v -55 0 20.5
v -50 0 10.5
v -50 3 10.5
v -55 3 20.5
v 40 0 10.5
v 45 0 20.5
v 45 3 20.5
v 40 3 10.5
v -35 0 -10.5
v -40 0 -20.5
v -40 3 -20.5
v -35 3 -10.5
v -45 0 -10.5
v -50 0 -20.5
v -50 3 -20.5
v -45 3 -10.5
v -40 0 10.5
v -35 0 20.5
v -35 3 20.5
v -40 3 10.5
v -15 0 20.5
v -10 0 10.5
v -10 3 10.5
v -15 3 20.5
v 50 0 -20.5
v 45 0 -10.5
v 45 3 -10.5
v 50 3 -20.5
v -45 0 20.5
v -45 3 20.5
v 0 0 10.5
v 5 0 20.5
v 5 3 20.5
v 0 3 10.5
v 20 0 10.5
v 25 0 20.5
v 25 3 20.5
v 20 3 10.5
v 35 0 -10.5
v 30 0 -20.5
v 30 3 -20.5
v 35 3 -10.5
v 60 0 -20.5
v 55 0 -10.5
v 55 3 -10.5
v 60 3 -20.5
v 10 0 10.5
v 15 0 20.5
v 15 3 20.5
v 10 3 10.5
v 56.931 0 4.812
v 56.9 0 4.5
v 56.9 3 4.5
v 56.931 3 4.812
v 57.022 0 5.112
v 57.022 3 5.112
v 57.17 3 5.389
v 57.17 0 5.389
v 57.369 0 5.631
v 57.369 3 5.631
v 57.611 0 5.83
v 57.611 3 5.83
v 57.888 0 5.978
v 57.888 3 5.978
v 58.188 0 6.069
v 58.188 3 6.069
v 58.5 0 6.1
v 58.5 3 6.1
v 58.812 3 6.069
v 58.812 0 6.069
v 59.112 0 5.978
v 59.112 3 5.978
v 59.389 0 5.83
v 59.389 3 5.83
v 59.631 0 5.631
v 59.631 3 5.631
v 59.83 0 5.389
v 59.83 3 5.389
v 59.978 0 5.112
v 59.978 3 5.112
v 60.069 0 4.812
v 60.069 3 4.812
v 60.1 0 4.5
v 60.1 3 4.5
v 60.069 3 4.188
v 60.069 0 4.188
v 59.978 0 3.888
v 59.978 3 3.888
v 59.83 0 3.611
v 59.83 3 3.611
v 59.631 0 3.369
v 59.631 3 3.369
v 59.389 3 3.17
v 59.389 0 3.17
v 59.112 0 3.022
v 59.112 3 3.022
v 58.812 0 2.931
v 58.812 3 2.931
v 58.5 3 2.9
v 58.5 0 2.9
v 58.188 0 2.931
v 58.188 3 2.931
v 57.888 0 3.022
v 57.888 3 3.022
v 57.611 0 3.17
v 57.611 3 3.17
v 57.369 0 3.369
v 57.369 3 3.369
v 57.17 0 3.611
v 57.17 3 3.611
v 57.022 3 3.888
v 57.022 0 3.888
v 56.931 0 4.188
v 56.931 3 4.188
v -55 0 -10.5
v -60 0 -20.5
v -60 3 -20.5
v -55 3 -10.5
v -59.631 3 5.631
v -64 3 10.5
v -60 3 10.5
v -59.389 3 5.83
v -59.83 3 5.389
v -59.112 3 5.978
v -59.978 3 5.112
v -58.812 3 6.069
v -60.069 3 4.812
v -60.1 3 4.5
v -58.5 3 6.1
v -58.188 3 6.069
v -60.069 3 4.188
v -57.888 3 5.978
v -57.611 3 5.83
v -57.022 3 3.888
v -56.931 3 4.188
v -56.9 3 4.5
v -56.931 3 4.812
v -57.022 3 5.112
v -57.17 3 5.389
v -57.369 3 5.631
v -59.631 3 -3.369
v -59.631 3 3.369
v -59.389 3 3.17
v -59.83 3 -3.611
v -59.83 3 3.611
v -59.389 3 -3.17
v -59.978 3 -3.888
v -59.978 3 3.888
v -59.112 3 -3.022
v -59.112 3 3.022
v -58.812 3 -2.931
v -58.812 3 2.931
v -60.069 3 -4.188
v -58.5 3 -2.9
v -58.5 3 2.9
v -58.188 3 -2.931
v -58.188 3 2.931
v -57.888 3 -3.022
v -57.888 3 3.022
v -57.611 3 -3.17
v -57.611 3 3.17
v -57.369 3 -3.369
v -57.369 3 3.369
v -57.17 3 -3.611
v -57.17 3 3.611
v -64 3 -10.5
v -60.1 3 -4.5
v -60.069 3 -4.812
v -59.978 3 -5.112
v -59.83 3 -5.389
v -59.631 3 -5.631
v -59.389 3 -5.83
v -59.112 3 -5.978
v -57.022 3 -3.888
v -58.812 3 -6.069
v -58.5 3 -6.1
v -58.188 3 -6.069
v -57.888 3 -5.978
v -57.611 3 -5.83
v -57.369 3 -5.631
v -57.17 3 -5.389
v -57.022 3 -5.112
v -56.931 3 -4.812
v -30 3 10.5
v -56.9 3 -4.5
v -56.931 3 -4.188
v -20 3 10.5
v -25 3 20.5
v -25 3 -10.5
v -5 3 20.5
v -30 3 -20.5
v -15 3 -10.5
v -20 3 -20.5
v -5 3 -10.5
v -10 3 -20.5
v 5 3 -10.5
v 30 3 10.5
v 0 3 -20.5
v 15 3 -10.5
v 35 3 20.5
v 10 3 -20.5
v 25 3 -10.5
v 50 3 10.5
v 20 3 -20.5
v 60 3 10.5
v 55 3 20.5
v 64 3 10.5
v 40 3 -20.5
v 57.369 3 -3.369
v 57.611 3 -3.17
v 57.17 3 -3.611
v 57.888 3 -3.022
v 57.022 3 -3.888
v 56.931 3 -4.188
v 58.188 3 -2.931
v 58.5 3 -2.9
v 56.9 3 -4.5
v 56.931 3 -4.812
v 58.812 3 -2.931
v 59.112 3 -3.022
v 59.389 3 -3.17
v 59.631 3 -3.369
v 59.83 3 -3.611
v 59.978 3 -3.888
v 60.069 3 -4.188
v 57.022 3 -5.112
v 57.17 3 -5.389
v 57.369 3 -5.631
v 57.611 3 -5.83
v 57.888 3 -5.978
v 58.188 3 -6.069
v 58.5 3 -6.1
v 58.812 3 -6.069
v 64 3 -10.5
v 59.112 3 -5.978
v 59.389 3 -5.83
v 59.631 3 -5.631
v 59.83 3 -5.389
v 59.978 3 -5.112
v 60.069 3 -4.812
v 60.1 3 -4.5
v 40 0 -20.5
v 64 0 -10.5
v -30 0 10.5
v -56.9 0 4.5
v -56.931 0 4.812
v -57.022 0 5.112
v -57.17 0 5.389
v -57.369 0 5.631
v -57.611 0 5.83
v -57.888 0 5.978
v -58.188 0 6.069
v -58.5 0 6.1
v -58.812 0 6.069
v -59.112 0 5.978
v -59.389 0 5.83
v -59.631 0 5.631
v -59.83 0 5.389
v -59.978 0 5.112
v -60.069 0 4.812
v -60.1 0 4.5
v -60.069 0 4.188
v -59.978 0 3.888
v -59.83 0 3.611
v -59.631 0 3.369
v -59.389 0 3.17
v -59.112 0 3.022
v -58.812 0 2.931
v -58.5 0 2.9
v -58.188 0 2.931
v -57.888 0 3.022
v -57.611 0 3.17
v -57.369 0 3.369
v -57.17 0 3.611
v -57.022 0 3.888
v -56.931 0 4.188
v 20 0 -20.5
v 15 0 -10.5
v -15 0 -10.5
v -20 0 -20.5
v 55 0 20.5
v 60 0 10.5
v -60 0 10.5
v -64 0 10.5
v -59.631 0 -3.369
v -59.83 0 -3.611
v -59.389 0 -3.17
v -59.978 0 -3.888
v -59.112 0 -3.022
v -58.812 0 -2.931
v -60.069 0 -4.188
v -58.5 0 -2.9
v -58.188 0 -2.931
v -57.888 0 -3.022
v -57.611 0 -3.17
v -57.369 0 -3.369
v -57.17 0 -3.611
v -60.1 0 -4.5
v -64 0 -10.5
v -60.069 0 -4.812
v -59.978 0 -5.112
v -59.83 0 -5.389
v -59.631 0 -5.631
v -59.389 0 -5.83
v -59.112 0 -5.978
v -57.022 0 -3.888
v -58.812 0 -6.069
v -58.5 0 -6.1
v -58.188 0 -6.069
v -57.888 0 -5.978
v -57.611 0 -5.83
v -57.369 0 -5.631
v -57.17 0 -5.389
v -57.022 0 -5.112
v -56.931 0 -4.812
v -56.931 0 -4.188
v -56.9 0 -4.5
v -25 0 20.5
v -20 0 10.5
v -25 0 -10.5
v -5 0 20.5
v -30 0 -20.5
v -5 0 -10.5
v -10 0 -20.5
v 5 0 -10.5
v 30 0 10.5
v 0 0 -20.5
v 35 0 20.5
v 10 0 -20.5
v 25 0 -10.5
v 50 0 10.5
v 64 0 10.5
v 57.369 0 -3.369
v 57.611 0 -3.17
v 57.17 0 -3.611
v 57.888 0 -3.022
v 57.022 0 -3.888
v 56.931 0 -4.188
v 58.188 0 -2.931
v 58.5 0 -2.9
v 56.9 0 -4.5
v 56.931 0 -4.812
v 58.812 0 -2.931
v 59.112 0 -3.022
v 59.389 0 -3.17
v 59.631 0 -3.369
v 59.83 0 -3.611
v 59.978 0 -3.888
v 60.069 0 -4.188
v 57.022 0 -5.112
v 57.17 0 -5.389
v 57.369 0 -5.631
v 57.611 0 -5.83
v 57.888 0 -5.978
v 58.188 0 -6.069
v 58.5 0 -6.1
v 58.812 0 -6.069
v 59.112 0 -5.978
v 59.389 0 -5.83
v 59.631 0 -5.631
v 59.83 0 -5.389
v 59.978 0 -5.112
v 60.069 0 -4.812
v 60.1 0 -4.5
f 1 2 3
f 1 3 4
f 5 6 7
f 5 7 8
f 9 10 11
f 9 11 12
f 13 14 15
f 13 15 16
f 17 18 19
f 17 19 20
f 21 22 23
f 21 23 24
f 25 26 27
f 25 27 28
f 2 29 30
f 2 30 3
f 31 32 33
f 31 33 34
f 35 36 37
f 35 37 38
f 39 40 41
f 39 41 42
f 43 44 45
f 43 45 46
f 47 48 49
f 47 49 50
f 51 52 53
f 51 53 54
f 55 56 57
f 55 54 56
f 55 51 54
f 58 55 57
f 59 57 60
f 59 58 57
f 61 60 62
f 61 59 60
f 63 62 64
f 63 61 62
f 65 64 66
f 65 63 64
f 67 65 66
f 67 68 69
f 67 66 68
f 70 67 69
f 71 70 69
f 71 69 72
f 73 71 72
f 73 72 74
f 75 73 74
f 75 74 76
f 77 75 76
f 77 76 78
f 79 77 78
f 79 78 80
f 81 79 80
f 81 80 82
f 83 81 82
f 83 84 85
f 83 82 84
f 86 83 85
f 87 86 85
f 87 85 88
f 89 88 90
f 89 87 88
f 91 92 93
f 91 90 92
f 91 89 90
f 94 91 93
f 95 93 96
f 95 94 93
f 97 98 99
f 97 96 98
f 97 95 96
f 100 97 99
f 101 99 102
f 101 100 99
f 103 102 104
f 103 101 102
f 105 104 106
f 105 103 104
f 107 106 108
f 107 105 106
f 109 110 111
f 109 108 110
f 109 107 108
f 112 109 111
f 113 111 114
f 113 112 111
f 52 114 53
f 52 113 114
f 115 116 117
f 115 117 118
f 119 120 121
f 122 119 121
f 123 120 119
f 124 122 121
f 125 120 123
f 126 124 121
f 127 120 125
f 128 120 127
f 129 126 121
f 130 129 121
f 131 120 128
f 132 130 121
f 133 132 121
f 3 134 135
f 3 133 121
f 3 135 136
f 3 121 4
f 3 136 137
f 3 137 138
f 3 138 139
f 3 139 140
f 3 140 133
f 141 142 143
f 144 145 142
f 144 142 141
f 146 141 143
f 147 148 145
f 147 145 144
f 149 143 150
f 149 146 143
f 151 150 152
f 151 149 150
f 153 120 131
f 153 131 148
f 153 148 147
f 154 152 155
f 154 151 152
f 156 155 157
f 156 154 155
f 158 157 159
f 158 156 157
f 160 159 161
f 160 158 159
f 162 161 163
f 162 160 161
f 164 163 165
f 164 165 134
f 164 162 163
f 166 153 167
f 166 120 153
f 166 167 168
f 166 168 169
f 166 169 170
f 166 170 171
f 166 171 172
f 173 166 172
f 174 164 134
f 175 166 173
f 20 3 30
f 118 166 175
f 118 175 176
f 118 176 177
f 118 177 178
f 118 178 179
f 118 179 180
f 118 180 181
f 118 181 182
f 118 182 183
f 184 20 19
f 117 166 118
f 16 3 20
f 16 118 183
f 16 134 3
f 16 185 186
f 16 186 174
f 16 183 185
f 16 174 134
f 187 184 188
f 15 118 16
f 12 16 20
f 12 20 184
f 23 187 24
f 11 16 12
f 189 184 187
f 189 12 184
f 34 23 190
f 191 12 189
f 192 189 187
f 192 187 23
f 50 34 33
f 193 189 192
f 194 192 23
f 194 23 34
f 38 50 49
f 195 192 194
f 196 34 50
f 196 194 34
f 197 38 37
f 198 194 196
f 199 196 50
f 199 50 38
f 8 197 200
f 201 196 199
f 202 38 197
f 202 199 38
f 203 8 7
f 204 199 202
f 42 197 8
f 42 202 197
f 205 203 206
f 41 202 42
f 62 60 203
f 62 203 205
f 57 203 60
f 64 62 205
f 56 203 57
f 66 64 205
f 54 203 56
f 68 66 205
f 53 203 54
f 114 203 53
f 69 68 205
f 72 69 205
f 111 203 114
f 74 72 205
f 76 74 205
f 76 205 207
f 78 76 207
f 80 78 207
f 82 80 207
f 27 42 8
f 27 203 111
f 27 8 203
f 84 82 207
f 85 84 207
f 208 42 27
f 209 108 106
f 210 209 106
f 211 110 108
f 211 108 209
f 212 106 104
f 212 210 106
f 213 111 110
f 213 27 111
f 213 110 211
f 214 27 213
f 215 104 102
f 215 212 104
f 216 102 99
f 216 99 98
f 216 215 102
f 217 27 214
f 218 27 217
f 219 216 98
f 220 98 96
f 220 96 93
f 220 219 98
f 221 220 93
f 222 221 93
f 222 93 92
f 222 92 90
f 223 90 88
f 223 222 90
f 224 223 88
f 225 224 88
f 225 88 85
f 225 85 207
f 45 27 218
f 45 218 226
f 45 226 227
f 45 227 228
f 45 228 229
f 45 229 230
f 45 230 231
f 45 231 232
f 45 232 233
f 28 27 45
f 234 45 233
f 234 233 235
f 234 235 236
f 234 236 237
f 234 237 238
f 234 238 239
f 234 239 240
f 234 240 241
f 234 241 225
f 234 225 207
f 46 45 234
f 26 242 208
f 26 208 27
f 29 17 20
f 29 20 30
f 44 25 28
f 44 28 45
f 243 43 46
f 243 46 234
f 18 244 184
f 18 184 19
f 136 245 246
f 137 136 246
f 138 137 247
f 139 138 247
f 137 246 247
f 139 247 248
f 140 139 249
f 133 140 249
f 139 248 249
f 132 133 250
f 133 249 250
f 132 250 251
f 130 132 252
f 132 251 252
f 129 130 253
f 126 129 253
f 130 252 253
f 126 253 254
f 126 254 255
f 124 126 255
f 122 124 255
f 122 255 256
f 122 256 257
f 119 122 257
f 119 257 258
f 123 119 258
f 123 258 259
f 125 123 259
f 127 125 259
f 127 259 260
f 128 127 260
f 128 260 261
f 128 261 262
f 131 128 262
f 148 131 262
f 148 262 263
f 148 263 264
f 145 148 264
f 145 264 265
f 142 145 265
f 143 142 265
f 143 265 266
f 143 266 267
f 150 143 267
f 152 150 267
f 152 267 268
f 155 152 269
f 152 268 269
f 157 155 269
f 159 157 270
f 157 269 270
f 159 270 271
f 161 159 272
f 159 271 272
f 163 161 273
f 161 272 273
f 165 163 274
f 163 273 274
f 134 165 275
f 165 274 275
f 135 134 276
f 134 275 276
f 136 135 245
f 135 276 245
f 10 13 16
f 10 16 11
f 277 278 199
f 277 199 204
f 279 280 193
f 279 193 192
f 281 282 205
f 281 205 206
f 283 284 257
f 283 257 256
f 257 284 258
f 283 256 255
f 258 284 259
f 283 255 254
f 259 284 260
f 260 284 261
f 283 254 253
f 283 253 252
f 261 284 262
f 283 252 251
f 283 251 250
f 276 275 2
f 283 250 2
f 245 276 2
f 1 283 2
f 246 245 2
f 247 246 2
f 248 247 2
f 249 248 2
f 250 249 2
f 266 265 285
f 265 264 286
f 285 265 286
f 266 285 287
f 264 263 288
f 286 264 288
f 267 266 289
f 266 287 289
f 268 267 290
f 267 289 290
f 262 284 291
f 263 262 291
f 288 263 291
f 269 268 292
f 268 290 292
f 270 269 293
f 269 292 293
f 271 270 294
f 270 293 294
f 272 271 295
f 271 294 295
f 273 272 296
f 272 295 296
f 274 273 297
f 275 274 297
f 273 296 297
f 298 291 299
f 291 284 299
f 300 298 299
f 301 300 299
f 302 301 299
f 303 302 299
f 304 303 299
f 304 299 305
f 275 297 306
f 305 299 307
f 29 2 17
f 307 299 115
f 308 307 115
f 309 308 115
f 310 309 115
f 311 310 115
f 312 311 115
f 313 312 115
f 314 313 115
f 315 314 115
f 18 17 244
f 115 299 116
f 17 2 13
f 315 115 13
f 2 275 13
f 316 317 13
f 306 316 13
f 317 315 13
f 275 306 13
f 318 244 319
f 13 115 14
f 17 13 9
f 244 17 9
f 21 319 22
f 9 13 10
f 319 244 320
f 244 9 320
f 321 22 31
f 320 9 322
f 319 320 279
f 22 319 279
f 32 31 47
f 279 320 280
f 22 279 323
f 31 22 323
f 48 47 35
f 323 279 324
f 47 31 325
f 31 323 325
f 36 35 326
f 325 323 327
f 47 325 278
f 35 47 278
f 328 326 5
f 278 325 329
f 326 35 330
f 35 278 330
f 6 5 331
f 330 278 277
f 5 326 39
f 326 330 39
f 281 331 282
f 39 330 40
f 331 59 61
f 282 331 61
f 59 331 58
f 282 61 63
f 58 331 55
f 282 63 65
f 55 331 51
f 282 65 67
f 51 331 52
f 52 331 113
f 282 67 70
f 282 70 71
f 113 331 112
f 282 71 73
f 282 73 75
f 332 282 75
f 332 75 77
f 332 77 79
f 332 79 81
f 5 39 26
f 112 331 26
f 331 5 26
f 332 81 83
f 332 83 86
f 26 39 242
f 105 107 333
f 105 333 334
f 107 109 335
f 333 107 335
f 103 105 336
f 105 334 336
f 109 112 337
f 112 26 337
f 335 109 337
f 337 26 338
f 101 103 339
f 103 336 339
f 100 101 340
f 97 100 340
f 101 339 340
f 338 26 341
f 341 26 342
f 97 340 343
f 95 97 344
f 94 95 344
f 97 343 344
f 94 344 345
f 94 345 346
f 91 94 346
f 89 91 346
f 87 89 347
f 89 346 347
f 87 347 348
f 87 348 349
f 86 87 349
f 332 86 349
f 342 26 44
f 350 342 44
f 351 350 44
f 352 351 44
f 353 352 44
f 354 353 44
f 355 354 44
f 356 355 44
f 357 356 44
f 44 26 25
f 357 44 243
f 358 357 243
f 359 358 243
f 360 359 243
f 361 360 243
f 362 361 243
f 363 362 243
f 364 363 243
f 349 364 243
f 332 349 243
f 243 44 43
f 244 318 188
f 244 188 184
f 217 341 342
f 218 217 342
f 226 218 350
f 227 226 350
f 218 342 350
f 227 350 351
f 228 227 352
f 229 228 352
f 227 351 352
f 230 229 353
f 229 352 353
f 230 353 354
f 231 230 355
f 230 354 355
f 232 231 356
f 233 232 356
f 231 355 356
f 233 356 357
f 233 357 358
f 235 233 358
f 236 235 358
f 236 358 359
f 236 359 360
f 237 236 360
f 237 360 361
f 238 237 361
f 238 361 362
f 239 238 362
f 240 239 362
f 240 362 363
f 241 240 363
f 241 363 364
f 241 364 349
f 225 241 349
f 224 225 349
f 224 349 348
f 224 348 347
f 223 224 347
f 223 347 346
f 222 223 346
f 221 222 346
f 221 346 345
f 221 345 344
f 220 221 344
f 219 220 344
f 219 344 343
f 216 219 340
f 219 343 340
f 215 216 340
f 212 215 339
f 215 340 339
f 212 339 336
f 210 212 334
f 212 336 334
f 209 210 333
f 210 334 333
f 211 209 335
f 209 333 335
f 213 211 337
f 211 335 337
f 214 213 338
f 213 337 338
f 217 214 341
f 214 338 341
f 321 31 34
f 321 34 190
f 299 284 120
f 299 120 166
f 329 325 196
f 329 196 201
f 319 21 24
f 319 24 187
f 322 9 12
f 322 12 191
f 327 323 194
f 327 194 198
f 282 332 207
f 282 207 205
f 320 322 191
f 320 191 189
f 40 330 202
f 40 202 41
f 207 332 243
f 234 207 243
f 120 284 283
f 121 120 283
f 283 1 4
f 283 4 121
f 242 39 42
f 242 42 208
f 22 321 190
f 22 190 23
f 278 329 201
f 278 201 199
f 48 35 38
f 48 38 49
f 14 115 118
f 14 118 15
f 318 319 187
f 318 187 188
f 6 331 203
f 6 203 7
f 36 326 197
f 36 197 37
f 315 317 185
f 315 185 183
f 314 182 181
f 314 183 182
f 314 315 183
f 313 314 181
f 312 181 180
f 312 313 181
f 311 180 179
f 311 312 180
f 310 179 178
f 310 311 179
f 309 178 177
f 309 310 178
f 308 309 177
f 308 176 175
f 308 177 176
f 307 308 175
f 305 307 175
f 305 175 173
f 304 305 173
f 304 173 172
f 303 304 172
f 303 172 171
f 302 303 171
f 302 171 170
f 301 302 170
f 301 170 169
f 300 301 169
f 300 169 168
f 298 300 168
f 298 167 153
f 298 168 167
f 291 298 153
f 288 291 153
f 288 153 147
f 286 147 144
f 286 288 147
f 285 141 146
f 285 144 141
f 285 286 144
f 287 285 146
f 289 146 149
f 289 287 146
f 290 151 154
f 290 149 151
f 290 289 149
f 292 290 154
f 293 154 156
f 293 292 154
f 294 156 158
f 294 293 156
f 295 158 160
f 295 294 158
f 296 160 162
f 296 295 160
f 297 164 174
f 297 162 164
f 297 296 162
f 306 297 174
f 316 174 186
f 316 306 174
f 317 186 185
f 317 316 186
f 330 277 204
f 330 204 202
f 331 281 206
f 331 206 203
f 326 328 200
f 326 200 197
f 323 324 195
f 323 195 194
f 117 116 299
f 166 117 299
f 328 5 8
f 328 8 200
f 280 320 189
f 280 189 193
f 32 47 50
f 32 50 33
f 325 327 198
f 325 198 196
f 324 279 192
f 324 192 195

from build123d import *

# Parameters (mm, degrees)
SKETCH1_W               = 128
SKETCH1_H               = 41
BOSS_EXTRUDE1_DEPTH     = 3
CUT_EXTRUDE2_START      = -4
CUT_EXTRUDE2_DEPTH      = 5
LPATTERN3_COUNT         = 12
LPATTERN3_PITCH         = 10
CUT_EXTRUDE3_START      = -4
CUT_EXTRUDE3_DEPTH      = 5
LPATTERN5_COUNT         = 12
LPATTERN5_PITCH         = 10
CUT_EXTRUDE4_START      = -4
SKETCH6_R               = 1.6
CUT_EXTRUDE4_DEPTH      = 5
MIRROR3_START           = -4
MIRROR3_COPY_1_SKETCH_R = 1.6
MIRROR3_COPY_1_DEPTH    = 5
CUT_EXTRUDE5_START      = -4
CUT_EXTRUDE5_DEPTH      = 5
CUT_EXTRUDE6_START      = -4
SKETCH8_W               = 4
SKETCH8_H               = 10
CUT_EXTRUDE6_DEPTH      = 5


with BuildPart() as part:
    # Sketch1 → Boss-Extrude1 (new body)
    with BuildSketch(Plane(origin=(0, 0, 0), x_dir=(1, 0, 0), z_dir=(0, 1, 0))):
        Rectangle(SKETCH1_W, SKETCH1_H)
    extrude(amount=BOSS_EXTRUDE1_DEPTH)

    # Sketch2 → Cut-Extrude2 (cut)
    with BuildSketch(Plane(origin=(0, 3, 0), x_dir=(1, 0, 0), z_dir=(0, 1, 0)).offset(CUT_EXTRUDE2_START)):
        Polygon((-60, 20.5), (-55, 10.5), (-50, 20.5), align=None)
    cut_extrude2 = extrude(amount=CUT_EXTRUDE2_DEPTH, mode=Mode.SUBTRACT)

    # LPattern3: Cut-Extrude2 ×12
    with Locations(*[(i * LPATTERN3_PITCH, 0, 0) for i in range(1, LPATTERN3_COUNT)]):
        add(cut_extrude2, mode=Mode.SUBTRACT)

    # Sketch5 → Cut-Extrude3 (cut)
    with BuildSketch(Plane(origin=(0, 3, 0), x_dir=(1, 0, 0), z_dir=(0, 1, 0)).offset(CUT_EXTRUDE3_START)):
        Polygon((-55, -20.5), (-60, -10.5), (-60, -20.5), align=None)
        Polygon((-50, -10.5), (-55, -20.5), (-50, -20.5), align=None)
    cut_extrude3 = extrude(amount=CUT_EXTRUDE3_DEPTH, mode=Mode.SUBTRACT)

    # LPattern5: Cut-Extrude3 ×12
    with Locations(*[(i * LPATTERN5_PITCH, 0, 0) for i in range(1, LPATTERN5_COUNT)]):
        add(cut_extrude3, mode=Mode.SUBTRACT)

    # Sketch6 → Cut-Extrude4 (cut)
    with BuildSketch(Plane(origin=(0, 3, 0), x_dir=(1, 0, 0), z_dir=(0, 1, 0)).offset(CUT_EXTRUDE4_START)):
        with Locations((-58.5, 4.5)):
            Circle(SKETCH6_R)
    cut_extrude4 = extrude(amount=CUT_EXTRUDE4_DEPTH, mode=Mode.SUBTRACT)

    # Mirror2: Cut-Extrude4 across plane
    add(cut_extrude4.mirror(Plane(origin=(0, 0, 0), x_dir=(0, 0, 1), z_dir=(1, 0, 0))), mode=Mode.SUBTRACT)

    # Mirror3: Cut-Extrude4 across plane
    add(cut_extrude4.mirror(Plane.XY), mode=Mode.SUBTRACT)

    # Mirror3 copy 1 sketch → Mirror3 copy 1 (cut)
    with BuildSketch(Plane(origin=(0, 3, 0), x_dir=(-1, 0, 0), z_dir=(0, 1, 0)).offset(MIRROR3_START)):
        with Locations((-58.5, 4.5)):
            Circle(MIRROR3_COPY_1_SKETCH_R)
    extrude(amount=MIRROR3_COPY_1_DEPTH, mode=Mode.SUBTRACT)

    # Sketch7 → Cut-Extrude5 (cut)
    with BuildSketch(Plane(origin=(0, 3, 0), x_dir=(1, 0, 0), z_dir=(0, 1, 0)).offset(CUT_EXTRUDE5_START)):
        Polygon((-60, 20.5), (-64, 10.5), (-64, 20.5), align=None)
    cut_extrude5 = extrude(amount=CUT_EXTRUDE5_DEPTH, mode=Mode.SUBTRACT)

    # Mirror4: Cut-Extrude5 across plane
    add(cut_extrude5.mirror(Plane(origin=(0, 0, 0), x_dir=(0, 0, 1), z_dir=(1, 0, 0))), mode=Mode.SUBTRACT)

    # Sketch8 → Cut-Extrude6 (cut)
    with BuildSketch(Plane(origin=(0, 3, 0), x_dir=(1, 0, 0), z_dir=(0, 1, 0)).offset(CUT_EXTRUDE6_START)):
        with Locations((-62, -15.5)):
            Rectangle(SKETCH8_W, SKETCH8_H)
    cut_extrude6 = extrude(amount=CUT_EXTRUDE6_DEPTH, mode=Mode.SUBTRACT)

    # Mirror5: Cut-Extrude6 across plane
    add(cut_extrude6.mirror(Plane(origin=(0, 0, 0), x_dir=(0, 0, 1), z_dir=(1, 0, 0))), mode=Mode.SUBTRACT)


solid = part.part
